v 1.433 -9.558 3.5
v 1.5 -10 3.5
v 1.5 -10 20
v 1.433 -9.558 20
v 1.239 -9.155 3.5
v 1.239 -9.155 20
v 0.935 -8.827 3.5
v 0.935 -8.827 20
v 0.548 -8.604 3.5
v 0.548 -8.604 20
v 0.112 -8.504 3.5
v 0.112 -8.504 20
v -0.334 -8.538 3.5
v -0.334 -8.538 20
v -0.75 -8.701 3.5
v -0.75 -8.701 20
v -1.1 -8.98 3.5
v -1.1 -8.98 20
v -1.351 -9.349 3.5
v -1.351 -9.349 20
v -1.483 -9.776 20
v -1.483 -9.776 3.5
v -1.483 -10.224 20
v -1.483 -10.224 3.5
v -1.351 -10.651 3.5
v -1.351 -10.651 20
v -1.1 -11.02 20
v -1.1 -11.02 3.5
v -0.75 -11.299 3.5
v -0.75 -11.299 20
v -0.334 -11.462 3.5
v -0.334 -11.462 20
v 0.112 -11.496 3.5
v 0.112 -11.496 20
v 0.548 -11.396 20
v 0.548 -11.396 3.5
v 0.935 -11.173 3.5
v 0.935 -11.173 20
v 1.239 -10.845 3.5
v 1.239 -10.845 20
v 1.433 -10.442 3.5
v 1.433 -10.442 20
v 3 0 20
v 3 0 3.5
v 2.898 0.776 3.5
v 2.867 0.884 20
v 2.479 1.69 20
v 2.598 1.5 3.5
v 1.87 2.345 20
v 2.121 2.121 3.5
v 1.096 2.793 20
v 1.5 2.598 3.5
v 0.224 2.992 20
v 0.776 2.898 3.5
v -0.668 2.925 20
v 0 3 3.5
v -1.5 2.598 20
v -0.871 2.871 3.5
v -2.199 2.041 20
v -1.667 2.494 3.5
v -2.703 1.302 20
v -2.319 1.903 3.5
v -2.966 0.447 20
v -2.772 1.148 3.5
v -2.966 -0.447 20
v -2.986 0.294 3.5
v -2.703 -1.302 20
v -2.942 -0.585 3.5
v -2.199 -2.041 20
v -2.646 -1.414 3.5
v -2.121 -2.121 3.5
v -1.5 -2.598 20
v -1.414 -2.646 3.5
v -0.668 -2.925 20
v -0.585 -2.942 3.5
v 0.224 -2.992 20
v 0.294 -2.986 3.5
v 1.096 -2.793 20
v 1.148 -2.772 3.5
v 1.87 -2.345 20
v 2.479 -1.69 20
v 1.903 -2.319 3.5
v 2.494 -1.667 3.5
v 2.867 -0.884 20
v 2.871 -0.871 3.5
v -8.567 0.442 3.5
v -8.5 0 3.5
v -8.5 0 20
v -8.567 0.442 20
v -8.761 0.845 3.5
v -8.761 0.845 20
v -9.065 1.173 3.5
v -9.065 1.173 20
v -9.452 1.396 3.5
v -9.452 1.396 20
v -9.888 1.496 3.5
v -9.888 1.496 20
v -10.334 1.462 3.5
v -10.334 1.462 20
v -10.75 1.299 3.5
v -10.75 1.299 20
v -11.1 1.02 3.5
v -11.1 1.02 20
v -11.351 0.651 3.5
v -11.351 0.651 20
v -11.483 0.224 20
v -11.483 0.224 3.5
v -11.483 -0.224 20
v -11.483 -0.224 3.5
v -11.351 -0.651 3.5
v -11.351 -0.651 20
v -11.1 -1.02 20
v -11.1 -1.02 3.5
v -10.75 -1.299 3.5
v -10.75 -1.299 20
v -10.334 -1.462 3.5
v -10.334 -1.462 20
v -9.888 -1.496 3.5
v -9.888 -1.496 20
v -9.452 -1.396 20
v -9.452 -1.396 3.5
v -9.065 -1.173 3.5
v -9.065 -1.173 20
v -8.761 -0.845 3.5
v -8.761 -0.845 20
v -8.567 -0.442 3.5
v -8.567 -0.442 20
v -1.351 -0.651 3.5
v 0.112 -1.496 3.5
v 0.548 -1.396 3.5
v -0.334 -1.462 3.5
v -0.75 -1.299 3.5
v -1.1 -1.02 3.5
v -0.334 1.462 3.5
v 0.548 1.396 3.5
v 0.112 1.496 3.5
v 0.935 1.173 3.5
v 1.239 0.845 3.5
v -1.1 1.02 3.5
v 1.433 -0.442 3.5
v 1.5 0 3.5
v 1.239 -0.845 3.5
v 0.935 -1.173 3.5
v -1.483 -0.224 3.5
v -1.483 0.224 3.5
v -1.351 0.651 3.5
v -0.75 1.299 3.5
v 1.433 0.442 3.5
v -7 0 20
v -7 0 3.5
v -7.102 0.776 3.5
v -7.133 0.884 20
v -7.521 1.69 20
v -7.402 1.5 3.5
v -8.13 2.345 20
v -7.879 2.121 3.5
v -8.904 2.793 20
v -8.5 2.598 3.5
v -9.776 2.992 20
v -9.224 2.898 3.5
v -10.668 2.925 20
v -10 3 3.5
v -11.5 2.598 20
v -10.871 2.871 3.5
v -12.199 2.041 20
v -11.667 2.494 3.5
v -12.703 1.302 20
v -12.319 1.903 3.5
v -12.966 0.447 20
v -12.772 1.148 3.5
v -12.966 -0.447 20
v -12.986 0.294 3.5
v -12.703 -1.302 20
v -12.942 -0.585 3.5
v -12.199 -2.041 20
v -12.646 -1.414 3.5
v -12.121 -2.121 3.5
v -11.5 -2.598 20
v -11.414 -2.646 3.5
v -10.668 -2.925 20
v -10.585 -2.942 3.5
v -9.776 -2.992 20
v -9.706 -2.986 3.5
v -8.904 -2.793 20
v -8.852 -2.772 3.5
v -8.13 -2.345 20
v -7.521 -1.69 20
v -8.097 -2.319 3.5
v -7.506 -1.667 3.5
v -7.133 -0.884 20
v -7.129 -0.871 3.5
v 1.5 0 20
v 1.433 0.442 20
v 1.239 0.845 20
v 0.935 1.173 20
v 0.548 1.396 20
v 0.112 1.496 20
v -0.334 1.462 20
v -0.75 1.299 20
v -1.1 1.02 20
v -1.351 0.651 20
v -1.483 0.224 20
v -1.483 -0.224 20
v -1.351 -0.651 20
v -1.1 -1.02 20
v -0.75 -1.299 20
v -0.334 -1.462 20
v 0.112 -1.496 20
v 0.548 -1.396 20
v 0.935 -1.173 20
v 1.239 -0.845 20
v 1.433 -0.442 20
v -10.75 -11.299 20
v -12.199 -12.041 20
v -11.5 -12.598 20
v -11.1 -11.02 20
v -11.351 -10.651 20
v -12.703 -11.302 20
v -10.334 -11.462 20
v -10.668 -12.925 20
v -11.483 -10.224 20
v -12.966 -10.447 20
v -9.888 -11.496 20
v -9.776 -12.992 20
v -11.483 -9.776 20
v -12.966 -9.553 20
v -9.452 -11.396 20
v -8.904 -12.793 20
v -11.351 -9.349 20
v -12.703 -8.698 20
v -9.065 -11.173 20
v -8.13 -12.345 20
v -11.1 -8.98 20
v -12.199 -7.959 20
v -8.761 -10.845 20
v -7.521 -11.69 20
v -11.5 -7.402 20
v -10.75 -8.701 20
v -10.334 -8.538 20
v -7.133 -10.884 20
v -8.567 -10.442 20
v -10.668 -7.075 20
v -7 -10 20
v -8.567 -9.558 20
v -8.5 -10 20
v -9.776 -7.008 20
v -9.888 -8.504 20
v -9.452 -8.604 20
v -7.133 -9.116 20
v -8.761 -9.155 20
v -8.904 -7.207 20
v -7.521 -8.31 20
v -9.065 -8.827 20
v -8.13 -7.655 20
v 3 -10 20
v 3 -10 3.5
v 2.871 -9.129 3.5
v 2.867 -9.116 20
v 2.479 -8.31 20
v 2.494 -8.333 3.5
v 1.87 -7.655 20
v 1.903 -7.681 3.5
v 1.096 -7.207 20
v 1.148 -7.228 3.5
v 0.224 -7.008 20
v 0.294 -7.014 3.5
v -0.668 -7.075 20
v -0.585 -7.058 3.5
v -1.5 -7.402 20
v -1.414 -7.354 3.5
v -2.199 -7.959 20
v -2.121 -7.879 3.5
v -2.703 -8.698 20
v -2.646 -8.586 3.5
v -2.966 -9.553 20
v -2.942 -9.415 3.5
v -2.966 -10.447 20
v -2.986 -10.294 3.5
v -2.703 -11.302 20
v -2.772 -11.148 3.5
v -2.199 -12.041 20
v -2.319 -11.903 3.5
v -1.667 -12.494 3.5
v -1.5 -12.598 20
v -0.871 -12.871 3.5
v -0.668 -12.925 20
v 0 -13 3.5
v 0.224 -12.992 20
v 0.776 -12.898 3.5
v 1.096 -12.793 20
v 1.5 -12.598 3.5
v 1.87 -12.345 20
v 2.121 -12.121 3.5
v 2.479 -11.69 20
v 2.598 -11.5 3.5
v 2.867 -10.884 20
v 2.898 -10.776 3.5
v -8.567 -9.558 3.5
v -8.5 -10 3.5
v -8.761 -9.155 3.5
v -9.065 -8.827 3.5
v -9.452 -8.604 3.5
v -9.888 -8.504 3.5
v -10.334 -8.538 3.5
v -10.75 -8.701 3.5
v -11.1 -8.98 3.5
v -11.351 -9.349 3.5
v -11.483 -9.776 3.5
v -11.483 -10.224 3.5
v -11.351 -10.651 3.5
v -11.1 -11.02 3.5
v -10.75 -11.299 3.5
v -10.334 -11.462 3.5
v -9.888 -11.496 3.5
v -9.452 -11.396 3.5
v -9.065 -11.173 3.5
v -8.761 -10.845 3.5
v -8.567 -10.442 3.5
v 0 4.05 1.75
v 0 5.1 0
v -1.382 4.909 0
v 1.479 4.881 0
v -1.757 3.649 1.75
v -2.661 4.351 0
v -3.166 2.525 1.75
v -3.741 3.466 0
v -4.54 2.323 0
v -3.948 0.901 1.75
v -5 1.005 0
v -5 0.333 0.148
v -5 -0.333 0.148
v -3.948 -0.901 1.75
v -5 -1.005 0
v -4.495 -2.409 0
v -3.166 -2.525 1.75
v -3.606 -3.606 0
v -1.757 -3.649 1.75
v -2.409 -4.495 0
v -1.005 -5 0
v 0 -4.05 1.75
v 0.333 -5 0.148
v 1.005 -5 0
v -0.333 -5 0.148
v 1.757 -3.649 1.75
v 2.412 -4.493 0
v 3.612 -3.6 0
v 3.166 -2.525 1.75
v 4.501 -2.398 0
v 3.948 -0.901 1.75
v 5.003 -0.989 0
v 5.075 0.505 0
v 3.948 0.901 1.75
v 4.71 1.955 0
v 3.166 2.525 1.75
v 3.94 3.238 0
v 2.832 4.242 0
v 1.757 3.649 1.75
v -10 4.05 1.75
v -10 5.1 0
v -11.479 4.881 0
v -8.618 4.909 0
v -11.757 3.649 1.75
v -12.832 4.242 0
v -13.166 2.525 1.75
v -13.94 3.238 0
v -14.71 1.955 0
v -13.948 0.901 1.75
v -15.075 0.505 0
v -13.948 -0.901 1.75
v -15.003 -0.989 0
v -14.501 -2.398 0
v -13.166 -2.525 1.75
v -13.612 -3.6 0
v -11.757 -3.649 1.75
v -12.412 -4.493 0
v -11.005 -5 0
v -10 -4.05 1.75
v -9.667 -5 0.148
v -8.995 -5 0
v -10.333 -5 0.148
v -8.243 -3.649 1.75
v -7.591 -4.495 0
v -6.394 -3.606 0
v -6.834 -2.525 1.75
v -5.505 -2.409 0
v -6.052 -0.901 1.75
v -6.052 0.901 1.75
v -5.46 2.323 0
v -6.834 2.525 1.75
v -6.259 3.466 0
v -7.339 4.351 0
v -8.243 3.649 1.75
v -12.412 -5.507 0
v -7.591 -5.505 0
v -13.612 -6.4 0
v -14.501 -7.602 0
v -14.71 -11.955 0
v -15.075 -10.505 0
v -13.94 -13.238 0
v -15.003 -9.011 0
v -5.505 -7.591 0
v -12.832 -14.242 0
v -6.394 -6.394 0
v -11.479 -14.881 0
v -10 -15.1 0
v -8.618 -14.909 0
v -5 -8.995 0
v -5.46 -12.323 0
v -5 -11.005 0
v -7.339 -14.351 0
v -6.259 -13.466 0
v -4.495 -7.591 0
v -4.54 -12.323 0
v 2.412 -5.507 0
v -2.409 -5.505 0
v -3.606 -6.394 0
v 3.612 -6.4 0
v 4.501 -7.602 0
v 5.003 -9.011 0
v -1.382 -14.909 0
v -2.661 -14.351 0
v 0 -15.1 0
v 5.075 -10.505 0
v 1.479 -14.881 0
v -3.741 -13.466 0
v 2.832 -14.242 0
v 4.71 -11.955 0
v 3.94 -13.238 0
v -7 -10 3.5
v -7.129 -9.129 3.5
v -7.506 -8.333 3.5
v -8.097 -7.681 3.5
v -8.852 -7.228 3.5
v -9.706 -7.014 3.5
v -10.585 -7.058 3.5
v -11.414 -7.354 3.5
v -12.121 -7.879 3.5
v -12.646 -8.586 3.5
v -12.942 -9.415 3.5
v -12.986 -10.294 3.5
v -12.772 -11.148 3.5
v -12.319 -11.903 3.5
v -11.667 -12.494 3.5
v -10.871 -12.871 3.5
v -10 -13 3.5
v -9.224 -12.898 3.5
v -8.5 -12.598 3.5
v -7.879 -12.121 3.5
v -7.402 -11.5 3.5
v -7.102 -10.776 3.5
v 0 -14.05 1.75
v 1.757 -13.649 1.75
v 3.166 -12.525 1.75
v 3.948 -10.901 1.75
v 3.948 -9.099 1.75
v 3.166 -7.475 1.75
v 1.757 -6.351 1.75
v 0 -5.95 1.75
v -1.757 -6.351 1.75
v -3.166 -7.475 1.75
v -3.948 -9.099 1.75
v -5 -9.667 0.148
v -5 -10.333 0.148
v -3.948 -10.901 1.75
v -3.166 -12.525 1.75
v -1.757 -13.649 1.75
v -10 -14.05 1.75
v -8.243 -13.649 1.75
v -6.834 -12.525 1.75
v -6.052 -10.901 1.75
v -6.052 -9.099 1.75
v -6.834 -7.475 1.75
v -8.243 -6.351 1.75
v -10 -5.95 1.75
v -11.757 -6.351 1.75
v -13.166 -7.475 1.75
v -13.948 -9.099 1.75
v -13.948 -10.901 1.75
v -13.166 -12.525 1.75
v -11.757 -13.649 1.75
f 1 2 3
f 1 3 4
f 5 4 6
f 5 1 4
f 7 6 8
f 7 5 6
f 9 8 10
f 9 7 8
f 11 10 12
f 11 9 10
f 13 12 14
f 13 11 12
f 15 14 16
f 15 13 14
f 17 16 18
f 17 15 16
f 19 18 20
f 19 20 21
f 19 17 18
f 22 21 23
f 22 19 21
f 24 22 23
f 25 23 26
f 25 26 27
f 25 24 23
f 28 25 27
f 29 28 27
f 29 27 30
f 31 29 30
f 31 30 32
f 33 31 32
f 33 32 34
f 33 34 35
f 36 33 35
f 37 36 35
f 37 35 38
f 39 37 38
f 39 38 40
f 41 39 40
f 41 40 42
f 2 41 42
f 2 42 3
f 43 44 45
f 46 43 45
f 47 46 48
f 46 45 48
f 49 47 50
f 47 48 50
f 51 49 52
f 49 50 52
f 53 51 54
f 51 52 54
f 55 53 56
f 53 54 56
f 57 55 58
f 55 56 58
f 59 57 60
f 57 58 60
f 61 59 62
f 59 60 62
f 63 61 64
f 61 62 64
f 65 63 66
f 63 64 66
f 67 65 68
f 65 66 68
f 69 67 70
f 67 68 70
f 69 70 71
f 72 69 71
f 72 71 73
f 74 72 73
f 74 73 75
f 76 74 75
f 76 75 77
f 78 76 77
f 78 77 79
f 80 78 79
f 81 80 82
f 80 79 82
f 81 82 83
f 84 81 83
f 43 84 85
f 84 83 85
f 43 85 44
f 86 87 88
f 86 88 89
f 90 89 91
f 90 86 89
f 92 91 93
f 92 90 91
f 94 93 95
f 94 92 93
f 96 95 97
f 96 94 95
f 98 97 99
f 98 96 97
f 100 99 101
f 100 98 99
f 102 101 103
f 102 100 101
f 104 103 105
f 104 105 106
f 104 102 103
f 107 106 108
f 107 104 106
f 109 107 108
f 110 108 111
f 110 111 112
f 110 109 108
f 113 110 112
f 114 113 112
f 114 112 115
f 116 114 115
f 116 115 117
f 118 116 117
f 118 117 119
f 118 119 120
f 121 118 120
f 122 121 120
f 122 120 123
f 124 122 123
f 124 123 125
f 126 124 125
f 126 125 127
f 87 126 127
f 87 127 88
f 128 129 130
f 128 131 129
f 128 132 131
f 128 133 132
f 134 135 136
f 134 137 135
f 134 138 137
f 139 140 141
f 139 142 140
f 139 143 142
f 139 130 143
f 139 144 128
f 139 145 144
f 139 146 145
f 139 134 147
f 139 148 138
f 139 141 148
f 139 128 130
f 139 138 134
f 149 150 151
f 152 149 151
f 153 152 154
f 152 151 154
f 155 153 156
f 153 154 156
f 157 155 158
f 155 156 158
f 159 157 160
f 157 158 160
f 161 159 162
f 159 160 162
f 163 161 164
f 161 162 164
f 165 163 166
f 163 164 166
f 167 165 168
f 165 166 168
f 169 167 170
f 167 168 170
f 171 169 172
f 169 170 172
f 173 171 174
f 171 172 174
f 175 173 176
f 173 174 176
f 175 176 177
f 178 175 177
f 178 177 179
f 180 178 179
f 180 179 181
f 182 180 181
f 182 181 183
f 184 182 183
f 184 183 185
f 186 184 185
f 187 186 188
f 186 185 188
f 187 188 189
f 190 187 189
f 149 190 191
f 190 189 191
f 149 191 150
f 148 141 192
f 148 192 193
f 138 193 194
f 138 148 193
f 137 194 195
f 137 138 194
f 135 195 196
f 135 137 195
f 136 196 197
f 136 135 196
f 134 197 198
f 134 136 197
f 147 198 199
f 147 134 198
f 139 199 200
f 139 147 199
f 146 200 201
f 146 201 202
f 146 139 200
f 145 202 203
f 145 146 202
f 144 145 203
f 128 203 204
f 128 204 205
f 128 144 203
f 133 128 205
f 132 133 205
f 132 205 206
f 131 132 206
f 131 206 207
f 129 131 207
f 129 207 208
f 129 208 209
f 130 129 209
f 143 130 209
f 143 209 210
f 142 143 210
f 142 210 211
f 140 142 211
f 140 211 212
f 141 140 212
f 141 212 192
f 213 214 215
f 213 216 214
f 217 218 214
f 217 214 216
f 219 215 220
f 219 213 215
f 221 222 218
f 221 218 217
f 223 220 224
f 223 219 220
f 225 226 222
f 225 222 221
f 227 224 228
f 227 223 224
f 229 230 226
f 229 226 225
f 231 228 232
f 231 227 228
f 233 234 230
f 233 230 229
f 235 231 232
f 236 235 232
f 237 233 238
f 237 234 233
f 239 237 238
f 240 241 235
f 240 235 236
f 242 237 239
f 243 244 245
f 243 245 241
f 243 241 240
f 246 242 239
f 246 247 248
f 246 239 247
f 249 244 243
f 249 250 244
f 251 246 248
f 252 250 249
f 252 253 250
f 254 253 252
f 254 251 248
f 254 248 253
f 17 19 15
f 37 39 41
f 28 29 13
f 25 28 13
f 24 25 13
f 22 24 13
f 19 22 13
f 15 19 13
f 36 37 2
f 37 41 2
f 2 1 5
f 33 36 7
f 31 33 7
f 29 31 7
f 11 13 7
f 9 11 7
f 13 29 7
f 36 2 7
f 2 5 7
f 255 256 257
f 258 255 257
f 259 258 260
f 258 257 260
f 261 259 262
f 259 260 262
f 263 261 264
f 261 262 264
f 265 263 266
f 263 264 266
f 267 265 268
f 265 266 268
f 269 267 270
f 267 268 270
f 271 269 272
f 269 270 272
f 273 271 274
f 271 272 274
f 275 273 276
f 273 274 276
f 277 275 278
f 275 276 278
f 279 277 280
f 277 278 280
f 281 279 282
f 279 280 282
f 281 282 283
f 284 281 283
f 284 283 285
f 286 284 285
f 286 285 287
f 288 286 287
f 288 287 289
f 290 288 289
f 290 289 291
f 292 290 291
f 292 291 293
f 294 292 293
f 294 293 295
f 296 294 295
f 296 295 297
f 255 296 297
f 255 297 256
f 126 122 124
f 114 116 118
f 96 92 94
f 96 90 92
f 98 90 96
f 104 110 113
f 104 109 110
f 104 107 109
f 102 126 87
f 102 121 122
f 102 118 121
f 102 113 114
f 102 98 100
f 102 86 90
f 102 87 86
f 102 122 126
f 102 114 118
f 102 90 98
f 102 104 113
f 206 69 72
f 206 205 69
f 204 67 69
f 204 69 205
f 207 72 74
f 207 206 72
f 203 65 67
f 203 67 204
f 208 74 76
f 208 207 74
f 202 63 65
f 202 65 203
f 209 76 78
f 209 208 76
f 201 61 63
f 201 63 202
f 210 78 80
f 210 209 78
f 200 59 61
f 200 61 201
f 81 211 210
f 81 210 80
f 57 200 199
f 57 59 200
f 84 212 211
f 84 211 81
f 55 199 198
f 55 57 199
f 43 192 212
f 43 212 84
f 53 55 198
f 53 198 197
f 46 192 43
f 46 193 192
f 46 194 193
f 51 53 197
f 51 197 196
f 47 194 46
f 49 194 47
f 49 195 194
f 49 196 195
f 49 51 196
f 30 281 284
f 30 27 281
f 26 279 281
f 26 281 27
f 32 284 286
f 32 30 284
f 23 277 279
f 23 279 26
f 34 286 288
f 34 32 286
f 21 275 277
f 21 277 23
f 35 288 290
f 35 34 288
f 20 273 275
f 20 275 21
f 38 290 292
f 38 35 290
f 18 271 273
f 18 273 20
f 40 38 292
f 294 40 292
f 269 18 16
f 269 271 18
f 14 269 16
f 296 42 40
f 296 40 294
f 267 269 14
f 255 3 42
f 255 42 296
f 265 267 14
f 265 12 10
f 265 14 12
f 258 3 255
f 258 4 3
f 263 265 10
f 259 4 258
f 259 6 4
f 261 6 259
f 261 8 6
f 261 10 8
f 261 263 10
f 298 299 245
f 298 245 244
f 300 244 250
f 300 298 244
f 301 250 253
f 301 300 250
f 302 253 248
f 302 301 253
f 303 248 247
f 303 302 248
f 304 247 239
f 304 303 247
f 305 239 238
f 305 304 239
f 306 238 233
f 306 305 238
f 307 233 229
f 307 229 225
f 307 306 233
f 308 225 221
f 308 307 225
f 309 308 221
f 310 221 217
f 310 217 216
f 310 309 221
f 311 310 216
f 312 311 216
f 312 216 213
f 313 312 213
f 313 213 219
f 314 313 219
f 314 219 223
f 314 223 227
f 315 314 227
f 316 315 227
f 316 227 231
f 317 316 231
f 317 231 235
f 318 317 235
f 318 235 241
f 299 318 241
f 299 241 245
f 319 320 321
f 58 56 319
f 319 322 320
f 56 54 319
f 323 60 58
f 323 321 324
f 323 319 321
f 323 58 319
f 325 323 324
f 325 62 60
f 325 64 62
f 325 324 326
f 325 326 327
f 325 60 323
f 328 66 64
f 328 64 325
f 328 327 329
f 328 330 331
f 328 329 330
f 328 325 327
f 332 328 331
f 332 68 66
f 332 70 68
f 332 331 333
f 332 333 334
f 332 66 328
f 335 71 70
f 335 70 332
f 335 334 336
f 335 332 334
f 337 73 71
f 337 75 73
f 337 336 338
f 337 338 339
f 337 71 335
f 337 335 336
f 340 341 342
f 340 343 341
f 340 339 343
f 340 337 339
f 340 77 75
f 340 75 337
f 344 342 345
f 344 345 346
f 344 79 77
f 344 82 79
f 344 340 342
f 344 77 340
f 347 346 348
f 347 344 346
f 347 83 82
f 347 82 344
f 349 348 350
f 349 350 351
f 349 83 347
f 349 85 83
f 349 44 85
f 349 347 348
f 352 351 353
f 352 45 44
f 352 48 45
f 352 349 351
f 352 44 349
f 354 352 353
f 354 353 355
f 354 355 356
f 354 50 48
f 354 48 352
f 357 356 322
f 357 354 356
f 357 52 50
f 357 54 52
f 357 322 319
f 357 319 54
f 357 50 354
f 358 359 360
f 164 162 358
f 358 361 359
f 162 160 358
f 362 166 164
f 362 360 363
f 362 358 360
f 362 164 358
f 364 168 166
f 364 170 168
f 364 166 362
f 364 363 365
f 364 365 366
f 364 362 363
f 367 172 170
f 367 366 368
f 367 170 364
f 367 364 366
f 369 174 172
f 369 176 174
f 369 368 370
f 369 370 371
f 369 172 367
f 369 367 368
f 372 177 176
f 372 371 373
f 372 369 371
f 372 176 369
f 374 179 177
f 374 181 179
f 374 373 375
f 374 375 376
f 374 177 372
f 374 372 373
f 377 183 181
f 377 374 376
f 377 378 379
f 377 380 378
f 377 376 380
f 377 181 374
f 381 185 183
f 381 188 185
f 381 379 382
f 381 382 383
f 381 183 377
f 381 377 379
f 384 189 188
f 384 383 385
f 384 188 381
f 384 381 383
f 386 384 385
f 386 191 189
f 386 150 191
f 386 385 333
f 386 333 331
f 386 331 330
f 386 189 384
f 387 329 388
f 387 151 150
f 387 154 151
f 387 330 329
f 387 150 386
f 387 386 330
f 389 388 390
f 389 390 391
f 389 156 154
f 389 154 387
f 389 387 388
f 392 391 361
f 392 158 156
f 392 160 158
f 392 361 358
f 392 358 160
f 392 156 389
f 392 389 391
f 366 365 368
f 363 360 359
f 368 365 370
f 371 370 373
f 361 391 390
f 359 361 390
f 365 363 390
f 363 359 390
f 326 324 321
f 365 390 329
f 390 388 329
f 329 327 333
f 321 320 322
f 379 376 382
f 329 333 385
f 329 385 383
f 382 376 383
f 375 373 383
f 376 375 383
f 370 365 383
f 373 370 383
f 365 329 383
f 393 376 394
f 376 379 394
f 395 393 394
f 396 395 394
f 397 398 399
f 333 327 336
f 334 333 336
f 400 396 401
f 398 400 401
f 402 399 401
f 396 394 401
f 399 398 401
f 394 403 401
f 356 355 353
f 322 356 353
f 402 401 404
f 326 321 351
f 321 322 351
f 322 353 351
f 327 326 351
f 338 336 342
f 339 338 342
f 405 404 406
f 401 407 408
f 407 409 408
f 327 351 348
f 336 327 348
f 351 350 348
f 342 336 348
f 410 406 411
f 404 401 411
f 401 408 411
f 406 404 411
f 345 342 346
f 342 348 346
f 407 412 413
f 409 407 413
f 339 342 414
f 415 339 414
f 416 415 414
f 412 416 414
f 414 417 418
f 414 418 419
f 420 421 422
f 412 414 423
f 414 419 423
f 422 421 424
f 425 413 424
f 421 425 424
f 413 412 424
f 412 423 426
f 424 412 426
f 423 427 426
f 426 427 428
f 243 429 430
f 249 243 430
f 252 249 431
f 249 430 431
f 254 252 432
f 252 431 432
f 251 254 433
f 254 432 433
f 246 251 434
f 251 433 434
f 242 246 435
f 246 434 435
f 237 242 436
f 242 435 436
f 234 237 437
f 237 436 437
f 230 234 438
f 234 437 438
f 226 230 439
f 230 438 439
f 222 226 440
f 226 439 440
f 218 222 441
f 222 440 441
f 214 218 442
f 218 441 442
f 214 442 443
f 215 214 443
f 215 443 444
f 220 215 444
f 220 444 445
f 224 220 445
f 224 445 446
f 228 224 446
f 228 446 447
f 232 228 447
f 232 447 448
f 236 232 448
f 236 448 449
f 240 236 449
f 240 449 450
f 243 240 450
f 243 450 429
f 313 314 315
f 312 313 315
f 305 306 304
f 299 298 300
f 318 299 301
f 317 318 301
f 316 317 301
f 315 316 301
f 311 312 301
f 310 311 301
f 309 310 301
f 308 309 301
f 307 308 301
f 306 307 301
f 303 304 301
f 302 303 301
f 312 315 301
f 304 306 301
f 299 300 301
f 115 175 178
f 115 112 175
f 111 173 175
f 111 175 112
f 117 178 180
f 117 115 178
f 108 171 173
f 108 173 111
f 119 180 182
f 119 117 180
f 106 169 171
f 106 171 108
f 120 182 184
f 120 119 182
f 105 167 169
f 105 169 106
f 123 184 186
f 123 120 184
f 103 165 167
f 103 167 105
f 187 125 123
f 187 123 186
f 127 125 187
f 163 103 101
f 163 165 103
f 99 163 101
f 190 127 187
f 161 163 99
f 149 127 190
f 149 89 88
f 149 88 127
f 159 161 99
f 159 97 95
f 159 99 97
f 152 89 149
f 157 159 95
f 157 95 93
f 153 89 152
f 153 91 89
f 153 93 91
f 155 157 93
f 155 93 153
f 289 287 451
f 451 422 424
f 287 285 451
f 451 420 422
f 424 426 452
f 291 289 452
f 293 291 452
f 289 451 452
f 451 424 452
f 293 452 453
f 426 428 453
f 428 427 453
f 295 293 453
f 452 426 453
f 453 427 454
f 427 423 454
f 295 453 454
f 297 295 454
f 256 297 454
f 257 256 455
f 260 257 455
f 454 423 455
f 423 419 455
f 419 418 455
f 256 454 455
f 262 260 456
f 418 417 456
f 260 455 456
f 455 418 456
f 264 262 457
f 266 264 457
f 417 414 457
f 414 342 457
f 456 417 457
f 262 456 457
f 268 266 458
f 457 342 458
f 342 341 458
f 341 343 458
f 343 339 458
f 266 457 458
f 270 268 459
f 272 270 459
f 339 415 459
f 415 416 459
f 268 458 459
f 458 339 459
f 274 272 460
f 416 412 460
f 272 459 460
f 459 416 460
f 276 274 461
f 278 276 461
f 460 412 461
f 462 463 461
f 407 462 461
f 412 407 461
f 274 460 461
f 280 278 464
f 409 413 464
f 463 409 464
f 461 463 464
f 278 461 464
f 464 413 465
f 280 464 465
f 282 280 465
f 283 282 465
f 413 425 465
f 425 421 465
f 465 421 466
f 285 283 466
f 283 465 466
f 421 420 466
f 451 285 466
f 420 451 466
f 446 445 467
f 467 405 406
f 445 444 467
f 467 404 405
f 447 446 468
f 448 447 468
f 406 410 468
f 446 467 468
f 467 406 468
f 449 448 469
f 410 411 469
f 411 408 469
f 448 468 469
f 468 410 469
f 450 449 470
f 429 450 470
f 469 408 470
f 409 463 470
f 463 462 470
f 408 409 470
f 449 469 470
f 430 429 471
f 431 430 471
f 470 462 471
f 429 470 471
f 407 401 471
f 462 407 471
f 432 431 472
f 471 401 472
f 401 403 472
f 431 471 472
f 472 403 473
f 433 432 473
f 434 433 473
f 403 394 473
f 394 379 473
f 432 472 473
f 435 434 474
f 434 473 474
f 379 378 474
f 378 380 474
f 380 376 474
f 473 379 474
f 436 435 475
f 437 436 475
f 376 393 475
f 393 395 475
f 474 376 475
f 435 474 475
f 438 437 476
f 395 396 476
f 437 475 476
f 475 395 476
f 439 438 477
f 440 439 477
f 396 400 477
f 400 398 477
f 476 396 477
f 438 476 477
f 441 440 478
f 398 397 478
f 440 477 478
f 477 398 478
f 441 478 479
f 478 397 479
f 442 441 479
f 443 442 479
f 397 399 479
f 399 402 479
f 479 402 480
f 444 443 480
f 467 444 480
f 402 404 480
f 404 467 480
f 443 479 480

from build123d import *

# Parameters (mm, degrees)
F0_R     = 3
F0_R_2   = 1.5
F1_DEPTH = 20


with BuildPart() as f1:
    # F0 (on Top) → F1 (new body)
    with BuildSketch(Plane.XY):
        Circle(F0_R)
        Circle(F0_R_2, mode=Mode.SUBTRACT)
        with Locations((-10, 0)):
            Circle(F0_R)
        with Locations((-10, 0)):
            Circle(F0_R_2, mode=Mode.SUBTRACT)
        with Locations((-10, -10)):
            Circle(F0_R)
        with Locations((-10, -10)):
            Circle(F0_R_2, mode=Mode.SUBTRACT)
        with Locations((0, -10)):
            Circle(F0_R)
        with Locations((0, -10)):
            Circle(F0_R_2, mode=Mode.SUBTRACT)
    extrude(amount=F1_DEPTH)

    # F2 (on Right) → F3 (revolve)
    with BuildSketch(Plane.YZ):
        Polygon((0, 3.5), (0, 0), (5.1, 0), (3, 3.5), align=None)
    revolve(axis=Axis((0, 0, 1.75), (0, 0, 1)))

    # F2 (on Right) → F4 (revolve)
    with BuildSketch(Plane.YZ):
        Polygon((-15.1, 0), (-10, 0), (-10, 3.5), (-13, 3.5), align=None)
    revolve(axis=Axis((0, -10, 1.75), (0, 0, 1)))

    # F6 (on offset) → F7 (revolve)
    with BuildSketch(Plane.YZ.offset(-10)):
        Polygon((0, 3.5), (0, 0), (5.1, 0), (3, 3.5), align=None)
    revolve(axis=Axis((-10, 0, 1.75), (0, 0, 1)))

    # F6 (on offset) → F8 (revolve)
    with BuildSketch(Plane.YZ.offset(-10)):
        Polygon((-15.1, 0), (-10, 0), (-10, 3.5), (-13, 3.5), align=None)
    revolve(axis=Axis((-10, -10, 1.75), (0, 0, 1)))


solid = f1.part
